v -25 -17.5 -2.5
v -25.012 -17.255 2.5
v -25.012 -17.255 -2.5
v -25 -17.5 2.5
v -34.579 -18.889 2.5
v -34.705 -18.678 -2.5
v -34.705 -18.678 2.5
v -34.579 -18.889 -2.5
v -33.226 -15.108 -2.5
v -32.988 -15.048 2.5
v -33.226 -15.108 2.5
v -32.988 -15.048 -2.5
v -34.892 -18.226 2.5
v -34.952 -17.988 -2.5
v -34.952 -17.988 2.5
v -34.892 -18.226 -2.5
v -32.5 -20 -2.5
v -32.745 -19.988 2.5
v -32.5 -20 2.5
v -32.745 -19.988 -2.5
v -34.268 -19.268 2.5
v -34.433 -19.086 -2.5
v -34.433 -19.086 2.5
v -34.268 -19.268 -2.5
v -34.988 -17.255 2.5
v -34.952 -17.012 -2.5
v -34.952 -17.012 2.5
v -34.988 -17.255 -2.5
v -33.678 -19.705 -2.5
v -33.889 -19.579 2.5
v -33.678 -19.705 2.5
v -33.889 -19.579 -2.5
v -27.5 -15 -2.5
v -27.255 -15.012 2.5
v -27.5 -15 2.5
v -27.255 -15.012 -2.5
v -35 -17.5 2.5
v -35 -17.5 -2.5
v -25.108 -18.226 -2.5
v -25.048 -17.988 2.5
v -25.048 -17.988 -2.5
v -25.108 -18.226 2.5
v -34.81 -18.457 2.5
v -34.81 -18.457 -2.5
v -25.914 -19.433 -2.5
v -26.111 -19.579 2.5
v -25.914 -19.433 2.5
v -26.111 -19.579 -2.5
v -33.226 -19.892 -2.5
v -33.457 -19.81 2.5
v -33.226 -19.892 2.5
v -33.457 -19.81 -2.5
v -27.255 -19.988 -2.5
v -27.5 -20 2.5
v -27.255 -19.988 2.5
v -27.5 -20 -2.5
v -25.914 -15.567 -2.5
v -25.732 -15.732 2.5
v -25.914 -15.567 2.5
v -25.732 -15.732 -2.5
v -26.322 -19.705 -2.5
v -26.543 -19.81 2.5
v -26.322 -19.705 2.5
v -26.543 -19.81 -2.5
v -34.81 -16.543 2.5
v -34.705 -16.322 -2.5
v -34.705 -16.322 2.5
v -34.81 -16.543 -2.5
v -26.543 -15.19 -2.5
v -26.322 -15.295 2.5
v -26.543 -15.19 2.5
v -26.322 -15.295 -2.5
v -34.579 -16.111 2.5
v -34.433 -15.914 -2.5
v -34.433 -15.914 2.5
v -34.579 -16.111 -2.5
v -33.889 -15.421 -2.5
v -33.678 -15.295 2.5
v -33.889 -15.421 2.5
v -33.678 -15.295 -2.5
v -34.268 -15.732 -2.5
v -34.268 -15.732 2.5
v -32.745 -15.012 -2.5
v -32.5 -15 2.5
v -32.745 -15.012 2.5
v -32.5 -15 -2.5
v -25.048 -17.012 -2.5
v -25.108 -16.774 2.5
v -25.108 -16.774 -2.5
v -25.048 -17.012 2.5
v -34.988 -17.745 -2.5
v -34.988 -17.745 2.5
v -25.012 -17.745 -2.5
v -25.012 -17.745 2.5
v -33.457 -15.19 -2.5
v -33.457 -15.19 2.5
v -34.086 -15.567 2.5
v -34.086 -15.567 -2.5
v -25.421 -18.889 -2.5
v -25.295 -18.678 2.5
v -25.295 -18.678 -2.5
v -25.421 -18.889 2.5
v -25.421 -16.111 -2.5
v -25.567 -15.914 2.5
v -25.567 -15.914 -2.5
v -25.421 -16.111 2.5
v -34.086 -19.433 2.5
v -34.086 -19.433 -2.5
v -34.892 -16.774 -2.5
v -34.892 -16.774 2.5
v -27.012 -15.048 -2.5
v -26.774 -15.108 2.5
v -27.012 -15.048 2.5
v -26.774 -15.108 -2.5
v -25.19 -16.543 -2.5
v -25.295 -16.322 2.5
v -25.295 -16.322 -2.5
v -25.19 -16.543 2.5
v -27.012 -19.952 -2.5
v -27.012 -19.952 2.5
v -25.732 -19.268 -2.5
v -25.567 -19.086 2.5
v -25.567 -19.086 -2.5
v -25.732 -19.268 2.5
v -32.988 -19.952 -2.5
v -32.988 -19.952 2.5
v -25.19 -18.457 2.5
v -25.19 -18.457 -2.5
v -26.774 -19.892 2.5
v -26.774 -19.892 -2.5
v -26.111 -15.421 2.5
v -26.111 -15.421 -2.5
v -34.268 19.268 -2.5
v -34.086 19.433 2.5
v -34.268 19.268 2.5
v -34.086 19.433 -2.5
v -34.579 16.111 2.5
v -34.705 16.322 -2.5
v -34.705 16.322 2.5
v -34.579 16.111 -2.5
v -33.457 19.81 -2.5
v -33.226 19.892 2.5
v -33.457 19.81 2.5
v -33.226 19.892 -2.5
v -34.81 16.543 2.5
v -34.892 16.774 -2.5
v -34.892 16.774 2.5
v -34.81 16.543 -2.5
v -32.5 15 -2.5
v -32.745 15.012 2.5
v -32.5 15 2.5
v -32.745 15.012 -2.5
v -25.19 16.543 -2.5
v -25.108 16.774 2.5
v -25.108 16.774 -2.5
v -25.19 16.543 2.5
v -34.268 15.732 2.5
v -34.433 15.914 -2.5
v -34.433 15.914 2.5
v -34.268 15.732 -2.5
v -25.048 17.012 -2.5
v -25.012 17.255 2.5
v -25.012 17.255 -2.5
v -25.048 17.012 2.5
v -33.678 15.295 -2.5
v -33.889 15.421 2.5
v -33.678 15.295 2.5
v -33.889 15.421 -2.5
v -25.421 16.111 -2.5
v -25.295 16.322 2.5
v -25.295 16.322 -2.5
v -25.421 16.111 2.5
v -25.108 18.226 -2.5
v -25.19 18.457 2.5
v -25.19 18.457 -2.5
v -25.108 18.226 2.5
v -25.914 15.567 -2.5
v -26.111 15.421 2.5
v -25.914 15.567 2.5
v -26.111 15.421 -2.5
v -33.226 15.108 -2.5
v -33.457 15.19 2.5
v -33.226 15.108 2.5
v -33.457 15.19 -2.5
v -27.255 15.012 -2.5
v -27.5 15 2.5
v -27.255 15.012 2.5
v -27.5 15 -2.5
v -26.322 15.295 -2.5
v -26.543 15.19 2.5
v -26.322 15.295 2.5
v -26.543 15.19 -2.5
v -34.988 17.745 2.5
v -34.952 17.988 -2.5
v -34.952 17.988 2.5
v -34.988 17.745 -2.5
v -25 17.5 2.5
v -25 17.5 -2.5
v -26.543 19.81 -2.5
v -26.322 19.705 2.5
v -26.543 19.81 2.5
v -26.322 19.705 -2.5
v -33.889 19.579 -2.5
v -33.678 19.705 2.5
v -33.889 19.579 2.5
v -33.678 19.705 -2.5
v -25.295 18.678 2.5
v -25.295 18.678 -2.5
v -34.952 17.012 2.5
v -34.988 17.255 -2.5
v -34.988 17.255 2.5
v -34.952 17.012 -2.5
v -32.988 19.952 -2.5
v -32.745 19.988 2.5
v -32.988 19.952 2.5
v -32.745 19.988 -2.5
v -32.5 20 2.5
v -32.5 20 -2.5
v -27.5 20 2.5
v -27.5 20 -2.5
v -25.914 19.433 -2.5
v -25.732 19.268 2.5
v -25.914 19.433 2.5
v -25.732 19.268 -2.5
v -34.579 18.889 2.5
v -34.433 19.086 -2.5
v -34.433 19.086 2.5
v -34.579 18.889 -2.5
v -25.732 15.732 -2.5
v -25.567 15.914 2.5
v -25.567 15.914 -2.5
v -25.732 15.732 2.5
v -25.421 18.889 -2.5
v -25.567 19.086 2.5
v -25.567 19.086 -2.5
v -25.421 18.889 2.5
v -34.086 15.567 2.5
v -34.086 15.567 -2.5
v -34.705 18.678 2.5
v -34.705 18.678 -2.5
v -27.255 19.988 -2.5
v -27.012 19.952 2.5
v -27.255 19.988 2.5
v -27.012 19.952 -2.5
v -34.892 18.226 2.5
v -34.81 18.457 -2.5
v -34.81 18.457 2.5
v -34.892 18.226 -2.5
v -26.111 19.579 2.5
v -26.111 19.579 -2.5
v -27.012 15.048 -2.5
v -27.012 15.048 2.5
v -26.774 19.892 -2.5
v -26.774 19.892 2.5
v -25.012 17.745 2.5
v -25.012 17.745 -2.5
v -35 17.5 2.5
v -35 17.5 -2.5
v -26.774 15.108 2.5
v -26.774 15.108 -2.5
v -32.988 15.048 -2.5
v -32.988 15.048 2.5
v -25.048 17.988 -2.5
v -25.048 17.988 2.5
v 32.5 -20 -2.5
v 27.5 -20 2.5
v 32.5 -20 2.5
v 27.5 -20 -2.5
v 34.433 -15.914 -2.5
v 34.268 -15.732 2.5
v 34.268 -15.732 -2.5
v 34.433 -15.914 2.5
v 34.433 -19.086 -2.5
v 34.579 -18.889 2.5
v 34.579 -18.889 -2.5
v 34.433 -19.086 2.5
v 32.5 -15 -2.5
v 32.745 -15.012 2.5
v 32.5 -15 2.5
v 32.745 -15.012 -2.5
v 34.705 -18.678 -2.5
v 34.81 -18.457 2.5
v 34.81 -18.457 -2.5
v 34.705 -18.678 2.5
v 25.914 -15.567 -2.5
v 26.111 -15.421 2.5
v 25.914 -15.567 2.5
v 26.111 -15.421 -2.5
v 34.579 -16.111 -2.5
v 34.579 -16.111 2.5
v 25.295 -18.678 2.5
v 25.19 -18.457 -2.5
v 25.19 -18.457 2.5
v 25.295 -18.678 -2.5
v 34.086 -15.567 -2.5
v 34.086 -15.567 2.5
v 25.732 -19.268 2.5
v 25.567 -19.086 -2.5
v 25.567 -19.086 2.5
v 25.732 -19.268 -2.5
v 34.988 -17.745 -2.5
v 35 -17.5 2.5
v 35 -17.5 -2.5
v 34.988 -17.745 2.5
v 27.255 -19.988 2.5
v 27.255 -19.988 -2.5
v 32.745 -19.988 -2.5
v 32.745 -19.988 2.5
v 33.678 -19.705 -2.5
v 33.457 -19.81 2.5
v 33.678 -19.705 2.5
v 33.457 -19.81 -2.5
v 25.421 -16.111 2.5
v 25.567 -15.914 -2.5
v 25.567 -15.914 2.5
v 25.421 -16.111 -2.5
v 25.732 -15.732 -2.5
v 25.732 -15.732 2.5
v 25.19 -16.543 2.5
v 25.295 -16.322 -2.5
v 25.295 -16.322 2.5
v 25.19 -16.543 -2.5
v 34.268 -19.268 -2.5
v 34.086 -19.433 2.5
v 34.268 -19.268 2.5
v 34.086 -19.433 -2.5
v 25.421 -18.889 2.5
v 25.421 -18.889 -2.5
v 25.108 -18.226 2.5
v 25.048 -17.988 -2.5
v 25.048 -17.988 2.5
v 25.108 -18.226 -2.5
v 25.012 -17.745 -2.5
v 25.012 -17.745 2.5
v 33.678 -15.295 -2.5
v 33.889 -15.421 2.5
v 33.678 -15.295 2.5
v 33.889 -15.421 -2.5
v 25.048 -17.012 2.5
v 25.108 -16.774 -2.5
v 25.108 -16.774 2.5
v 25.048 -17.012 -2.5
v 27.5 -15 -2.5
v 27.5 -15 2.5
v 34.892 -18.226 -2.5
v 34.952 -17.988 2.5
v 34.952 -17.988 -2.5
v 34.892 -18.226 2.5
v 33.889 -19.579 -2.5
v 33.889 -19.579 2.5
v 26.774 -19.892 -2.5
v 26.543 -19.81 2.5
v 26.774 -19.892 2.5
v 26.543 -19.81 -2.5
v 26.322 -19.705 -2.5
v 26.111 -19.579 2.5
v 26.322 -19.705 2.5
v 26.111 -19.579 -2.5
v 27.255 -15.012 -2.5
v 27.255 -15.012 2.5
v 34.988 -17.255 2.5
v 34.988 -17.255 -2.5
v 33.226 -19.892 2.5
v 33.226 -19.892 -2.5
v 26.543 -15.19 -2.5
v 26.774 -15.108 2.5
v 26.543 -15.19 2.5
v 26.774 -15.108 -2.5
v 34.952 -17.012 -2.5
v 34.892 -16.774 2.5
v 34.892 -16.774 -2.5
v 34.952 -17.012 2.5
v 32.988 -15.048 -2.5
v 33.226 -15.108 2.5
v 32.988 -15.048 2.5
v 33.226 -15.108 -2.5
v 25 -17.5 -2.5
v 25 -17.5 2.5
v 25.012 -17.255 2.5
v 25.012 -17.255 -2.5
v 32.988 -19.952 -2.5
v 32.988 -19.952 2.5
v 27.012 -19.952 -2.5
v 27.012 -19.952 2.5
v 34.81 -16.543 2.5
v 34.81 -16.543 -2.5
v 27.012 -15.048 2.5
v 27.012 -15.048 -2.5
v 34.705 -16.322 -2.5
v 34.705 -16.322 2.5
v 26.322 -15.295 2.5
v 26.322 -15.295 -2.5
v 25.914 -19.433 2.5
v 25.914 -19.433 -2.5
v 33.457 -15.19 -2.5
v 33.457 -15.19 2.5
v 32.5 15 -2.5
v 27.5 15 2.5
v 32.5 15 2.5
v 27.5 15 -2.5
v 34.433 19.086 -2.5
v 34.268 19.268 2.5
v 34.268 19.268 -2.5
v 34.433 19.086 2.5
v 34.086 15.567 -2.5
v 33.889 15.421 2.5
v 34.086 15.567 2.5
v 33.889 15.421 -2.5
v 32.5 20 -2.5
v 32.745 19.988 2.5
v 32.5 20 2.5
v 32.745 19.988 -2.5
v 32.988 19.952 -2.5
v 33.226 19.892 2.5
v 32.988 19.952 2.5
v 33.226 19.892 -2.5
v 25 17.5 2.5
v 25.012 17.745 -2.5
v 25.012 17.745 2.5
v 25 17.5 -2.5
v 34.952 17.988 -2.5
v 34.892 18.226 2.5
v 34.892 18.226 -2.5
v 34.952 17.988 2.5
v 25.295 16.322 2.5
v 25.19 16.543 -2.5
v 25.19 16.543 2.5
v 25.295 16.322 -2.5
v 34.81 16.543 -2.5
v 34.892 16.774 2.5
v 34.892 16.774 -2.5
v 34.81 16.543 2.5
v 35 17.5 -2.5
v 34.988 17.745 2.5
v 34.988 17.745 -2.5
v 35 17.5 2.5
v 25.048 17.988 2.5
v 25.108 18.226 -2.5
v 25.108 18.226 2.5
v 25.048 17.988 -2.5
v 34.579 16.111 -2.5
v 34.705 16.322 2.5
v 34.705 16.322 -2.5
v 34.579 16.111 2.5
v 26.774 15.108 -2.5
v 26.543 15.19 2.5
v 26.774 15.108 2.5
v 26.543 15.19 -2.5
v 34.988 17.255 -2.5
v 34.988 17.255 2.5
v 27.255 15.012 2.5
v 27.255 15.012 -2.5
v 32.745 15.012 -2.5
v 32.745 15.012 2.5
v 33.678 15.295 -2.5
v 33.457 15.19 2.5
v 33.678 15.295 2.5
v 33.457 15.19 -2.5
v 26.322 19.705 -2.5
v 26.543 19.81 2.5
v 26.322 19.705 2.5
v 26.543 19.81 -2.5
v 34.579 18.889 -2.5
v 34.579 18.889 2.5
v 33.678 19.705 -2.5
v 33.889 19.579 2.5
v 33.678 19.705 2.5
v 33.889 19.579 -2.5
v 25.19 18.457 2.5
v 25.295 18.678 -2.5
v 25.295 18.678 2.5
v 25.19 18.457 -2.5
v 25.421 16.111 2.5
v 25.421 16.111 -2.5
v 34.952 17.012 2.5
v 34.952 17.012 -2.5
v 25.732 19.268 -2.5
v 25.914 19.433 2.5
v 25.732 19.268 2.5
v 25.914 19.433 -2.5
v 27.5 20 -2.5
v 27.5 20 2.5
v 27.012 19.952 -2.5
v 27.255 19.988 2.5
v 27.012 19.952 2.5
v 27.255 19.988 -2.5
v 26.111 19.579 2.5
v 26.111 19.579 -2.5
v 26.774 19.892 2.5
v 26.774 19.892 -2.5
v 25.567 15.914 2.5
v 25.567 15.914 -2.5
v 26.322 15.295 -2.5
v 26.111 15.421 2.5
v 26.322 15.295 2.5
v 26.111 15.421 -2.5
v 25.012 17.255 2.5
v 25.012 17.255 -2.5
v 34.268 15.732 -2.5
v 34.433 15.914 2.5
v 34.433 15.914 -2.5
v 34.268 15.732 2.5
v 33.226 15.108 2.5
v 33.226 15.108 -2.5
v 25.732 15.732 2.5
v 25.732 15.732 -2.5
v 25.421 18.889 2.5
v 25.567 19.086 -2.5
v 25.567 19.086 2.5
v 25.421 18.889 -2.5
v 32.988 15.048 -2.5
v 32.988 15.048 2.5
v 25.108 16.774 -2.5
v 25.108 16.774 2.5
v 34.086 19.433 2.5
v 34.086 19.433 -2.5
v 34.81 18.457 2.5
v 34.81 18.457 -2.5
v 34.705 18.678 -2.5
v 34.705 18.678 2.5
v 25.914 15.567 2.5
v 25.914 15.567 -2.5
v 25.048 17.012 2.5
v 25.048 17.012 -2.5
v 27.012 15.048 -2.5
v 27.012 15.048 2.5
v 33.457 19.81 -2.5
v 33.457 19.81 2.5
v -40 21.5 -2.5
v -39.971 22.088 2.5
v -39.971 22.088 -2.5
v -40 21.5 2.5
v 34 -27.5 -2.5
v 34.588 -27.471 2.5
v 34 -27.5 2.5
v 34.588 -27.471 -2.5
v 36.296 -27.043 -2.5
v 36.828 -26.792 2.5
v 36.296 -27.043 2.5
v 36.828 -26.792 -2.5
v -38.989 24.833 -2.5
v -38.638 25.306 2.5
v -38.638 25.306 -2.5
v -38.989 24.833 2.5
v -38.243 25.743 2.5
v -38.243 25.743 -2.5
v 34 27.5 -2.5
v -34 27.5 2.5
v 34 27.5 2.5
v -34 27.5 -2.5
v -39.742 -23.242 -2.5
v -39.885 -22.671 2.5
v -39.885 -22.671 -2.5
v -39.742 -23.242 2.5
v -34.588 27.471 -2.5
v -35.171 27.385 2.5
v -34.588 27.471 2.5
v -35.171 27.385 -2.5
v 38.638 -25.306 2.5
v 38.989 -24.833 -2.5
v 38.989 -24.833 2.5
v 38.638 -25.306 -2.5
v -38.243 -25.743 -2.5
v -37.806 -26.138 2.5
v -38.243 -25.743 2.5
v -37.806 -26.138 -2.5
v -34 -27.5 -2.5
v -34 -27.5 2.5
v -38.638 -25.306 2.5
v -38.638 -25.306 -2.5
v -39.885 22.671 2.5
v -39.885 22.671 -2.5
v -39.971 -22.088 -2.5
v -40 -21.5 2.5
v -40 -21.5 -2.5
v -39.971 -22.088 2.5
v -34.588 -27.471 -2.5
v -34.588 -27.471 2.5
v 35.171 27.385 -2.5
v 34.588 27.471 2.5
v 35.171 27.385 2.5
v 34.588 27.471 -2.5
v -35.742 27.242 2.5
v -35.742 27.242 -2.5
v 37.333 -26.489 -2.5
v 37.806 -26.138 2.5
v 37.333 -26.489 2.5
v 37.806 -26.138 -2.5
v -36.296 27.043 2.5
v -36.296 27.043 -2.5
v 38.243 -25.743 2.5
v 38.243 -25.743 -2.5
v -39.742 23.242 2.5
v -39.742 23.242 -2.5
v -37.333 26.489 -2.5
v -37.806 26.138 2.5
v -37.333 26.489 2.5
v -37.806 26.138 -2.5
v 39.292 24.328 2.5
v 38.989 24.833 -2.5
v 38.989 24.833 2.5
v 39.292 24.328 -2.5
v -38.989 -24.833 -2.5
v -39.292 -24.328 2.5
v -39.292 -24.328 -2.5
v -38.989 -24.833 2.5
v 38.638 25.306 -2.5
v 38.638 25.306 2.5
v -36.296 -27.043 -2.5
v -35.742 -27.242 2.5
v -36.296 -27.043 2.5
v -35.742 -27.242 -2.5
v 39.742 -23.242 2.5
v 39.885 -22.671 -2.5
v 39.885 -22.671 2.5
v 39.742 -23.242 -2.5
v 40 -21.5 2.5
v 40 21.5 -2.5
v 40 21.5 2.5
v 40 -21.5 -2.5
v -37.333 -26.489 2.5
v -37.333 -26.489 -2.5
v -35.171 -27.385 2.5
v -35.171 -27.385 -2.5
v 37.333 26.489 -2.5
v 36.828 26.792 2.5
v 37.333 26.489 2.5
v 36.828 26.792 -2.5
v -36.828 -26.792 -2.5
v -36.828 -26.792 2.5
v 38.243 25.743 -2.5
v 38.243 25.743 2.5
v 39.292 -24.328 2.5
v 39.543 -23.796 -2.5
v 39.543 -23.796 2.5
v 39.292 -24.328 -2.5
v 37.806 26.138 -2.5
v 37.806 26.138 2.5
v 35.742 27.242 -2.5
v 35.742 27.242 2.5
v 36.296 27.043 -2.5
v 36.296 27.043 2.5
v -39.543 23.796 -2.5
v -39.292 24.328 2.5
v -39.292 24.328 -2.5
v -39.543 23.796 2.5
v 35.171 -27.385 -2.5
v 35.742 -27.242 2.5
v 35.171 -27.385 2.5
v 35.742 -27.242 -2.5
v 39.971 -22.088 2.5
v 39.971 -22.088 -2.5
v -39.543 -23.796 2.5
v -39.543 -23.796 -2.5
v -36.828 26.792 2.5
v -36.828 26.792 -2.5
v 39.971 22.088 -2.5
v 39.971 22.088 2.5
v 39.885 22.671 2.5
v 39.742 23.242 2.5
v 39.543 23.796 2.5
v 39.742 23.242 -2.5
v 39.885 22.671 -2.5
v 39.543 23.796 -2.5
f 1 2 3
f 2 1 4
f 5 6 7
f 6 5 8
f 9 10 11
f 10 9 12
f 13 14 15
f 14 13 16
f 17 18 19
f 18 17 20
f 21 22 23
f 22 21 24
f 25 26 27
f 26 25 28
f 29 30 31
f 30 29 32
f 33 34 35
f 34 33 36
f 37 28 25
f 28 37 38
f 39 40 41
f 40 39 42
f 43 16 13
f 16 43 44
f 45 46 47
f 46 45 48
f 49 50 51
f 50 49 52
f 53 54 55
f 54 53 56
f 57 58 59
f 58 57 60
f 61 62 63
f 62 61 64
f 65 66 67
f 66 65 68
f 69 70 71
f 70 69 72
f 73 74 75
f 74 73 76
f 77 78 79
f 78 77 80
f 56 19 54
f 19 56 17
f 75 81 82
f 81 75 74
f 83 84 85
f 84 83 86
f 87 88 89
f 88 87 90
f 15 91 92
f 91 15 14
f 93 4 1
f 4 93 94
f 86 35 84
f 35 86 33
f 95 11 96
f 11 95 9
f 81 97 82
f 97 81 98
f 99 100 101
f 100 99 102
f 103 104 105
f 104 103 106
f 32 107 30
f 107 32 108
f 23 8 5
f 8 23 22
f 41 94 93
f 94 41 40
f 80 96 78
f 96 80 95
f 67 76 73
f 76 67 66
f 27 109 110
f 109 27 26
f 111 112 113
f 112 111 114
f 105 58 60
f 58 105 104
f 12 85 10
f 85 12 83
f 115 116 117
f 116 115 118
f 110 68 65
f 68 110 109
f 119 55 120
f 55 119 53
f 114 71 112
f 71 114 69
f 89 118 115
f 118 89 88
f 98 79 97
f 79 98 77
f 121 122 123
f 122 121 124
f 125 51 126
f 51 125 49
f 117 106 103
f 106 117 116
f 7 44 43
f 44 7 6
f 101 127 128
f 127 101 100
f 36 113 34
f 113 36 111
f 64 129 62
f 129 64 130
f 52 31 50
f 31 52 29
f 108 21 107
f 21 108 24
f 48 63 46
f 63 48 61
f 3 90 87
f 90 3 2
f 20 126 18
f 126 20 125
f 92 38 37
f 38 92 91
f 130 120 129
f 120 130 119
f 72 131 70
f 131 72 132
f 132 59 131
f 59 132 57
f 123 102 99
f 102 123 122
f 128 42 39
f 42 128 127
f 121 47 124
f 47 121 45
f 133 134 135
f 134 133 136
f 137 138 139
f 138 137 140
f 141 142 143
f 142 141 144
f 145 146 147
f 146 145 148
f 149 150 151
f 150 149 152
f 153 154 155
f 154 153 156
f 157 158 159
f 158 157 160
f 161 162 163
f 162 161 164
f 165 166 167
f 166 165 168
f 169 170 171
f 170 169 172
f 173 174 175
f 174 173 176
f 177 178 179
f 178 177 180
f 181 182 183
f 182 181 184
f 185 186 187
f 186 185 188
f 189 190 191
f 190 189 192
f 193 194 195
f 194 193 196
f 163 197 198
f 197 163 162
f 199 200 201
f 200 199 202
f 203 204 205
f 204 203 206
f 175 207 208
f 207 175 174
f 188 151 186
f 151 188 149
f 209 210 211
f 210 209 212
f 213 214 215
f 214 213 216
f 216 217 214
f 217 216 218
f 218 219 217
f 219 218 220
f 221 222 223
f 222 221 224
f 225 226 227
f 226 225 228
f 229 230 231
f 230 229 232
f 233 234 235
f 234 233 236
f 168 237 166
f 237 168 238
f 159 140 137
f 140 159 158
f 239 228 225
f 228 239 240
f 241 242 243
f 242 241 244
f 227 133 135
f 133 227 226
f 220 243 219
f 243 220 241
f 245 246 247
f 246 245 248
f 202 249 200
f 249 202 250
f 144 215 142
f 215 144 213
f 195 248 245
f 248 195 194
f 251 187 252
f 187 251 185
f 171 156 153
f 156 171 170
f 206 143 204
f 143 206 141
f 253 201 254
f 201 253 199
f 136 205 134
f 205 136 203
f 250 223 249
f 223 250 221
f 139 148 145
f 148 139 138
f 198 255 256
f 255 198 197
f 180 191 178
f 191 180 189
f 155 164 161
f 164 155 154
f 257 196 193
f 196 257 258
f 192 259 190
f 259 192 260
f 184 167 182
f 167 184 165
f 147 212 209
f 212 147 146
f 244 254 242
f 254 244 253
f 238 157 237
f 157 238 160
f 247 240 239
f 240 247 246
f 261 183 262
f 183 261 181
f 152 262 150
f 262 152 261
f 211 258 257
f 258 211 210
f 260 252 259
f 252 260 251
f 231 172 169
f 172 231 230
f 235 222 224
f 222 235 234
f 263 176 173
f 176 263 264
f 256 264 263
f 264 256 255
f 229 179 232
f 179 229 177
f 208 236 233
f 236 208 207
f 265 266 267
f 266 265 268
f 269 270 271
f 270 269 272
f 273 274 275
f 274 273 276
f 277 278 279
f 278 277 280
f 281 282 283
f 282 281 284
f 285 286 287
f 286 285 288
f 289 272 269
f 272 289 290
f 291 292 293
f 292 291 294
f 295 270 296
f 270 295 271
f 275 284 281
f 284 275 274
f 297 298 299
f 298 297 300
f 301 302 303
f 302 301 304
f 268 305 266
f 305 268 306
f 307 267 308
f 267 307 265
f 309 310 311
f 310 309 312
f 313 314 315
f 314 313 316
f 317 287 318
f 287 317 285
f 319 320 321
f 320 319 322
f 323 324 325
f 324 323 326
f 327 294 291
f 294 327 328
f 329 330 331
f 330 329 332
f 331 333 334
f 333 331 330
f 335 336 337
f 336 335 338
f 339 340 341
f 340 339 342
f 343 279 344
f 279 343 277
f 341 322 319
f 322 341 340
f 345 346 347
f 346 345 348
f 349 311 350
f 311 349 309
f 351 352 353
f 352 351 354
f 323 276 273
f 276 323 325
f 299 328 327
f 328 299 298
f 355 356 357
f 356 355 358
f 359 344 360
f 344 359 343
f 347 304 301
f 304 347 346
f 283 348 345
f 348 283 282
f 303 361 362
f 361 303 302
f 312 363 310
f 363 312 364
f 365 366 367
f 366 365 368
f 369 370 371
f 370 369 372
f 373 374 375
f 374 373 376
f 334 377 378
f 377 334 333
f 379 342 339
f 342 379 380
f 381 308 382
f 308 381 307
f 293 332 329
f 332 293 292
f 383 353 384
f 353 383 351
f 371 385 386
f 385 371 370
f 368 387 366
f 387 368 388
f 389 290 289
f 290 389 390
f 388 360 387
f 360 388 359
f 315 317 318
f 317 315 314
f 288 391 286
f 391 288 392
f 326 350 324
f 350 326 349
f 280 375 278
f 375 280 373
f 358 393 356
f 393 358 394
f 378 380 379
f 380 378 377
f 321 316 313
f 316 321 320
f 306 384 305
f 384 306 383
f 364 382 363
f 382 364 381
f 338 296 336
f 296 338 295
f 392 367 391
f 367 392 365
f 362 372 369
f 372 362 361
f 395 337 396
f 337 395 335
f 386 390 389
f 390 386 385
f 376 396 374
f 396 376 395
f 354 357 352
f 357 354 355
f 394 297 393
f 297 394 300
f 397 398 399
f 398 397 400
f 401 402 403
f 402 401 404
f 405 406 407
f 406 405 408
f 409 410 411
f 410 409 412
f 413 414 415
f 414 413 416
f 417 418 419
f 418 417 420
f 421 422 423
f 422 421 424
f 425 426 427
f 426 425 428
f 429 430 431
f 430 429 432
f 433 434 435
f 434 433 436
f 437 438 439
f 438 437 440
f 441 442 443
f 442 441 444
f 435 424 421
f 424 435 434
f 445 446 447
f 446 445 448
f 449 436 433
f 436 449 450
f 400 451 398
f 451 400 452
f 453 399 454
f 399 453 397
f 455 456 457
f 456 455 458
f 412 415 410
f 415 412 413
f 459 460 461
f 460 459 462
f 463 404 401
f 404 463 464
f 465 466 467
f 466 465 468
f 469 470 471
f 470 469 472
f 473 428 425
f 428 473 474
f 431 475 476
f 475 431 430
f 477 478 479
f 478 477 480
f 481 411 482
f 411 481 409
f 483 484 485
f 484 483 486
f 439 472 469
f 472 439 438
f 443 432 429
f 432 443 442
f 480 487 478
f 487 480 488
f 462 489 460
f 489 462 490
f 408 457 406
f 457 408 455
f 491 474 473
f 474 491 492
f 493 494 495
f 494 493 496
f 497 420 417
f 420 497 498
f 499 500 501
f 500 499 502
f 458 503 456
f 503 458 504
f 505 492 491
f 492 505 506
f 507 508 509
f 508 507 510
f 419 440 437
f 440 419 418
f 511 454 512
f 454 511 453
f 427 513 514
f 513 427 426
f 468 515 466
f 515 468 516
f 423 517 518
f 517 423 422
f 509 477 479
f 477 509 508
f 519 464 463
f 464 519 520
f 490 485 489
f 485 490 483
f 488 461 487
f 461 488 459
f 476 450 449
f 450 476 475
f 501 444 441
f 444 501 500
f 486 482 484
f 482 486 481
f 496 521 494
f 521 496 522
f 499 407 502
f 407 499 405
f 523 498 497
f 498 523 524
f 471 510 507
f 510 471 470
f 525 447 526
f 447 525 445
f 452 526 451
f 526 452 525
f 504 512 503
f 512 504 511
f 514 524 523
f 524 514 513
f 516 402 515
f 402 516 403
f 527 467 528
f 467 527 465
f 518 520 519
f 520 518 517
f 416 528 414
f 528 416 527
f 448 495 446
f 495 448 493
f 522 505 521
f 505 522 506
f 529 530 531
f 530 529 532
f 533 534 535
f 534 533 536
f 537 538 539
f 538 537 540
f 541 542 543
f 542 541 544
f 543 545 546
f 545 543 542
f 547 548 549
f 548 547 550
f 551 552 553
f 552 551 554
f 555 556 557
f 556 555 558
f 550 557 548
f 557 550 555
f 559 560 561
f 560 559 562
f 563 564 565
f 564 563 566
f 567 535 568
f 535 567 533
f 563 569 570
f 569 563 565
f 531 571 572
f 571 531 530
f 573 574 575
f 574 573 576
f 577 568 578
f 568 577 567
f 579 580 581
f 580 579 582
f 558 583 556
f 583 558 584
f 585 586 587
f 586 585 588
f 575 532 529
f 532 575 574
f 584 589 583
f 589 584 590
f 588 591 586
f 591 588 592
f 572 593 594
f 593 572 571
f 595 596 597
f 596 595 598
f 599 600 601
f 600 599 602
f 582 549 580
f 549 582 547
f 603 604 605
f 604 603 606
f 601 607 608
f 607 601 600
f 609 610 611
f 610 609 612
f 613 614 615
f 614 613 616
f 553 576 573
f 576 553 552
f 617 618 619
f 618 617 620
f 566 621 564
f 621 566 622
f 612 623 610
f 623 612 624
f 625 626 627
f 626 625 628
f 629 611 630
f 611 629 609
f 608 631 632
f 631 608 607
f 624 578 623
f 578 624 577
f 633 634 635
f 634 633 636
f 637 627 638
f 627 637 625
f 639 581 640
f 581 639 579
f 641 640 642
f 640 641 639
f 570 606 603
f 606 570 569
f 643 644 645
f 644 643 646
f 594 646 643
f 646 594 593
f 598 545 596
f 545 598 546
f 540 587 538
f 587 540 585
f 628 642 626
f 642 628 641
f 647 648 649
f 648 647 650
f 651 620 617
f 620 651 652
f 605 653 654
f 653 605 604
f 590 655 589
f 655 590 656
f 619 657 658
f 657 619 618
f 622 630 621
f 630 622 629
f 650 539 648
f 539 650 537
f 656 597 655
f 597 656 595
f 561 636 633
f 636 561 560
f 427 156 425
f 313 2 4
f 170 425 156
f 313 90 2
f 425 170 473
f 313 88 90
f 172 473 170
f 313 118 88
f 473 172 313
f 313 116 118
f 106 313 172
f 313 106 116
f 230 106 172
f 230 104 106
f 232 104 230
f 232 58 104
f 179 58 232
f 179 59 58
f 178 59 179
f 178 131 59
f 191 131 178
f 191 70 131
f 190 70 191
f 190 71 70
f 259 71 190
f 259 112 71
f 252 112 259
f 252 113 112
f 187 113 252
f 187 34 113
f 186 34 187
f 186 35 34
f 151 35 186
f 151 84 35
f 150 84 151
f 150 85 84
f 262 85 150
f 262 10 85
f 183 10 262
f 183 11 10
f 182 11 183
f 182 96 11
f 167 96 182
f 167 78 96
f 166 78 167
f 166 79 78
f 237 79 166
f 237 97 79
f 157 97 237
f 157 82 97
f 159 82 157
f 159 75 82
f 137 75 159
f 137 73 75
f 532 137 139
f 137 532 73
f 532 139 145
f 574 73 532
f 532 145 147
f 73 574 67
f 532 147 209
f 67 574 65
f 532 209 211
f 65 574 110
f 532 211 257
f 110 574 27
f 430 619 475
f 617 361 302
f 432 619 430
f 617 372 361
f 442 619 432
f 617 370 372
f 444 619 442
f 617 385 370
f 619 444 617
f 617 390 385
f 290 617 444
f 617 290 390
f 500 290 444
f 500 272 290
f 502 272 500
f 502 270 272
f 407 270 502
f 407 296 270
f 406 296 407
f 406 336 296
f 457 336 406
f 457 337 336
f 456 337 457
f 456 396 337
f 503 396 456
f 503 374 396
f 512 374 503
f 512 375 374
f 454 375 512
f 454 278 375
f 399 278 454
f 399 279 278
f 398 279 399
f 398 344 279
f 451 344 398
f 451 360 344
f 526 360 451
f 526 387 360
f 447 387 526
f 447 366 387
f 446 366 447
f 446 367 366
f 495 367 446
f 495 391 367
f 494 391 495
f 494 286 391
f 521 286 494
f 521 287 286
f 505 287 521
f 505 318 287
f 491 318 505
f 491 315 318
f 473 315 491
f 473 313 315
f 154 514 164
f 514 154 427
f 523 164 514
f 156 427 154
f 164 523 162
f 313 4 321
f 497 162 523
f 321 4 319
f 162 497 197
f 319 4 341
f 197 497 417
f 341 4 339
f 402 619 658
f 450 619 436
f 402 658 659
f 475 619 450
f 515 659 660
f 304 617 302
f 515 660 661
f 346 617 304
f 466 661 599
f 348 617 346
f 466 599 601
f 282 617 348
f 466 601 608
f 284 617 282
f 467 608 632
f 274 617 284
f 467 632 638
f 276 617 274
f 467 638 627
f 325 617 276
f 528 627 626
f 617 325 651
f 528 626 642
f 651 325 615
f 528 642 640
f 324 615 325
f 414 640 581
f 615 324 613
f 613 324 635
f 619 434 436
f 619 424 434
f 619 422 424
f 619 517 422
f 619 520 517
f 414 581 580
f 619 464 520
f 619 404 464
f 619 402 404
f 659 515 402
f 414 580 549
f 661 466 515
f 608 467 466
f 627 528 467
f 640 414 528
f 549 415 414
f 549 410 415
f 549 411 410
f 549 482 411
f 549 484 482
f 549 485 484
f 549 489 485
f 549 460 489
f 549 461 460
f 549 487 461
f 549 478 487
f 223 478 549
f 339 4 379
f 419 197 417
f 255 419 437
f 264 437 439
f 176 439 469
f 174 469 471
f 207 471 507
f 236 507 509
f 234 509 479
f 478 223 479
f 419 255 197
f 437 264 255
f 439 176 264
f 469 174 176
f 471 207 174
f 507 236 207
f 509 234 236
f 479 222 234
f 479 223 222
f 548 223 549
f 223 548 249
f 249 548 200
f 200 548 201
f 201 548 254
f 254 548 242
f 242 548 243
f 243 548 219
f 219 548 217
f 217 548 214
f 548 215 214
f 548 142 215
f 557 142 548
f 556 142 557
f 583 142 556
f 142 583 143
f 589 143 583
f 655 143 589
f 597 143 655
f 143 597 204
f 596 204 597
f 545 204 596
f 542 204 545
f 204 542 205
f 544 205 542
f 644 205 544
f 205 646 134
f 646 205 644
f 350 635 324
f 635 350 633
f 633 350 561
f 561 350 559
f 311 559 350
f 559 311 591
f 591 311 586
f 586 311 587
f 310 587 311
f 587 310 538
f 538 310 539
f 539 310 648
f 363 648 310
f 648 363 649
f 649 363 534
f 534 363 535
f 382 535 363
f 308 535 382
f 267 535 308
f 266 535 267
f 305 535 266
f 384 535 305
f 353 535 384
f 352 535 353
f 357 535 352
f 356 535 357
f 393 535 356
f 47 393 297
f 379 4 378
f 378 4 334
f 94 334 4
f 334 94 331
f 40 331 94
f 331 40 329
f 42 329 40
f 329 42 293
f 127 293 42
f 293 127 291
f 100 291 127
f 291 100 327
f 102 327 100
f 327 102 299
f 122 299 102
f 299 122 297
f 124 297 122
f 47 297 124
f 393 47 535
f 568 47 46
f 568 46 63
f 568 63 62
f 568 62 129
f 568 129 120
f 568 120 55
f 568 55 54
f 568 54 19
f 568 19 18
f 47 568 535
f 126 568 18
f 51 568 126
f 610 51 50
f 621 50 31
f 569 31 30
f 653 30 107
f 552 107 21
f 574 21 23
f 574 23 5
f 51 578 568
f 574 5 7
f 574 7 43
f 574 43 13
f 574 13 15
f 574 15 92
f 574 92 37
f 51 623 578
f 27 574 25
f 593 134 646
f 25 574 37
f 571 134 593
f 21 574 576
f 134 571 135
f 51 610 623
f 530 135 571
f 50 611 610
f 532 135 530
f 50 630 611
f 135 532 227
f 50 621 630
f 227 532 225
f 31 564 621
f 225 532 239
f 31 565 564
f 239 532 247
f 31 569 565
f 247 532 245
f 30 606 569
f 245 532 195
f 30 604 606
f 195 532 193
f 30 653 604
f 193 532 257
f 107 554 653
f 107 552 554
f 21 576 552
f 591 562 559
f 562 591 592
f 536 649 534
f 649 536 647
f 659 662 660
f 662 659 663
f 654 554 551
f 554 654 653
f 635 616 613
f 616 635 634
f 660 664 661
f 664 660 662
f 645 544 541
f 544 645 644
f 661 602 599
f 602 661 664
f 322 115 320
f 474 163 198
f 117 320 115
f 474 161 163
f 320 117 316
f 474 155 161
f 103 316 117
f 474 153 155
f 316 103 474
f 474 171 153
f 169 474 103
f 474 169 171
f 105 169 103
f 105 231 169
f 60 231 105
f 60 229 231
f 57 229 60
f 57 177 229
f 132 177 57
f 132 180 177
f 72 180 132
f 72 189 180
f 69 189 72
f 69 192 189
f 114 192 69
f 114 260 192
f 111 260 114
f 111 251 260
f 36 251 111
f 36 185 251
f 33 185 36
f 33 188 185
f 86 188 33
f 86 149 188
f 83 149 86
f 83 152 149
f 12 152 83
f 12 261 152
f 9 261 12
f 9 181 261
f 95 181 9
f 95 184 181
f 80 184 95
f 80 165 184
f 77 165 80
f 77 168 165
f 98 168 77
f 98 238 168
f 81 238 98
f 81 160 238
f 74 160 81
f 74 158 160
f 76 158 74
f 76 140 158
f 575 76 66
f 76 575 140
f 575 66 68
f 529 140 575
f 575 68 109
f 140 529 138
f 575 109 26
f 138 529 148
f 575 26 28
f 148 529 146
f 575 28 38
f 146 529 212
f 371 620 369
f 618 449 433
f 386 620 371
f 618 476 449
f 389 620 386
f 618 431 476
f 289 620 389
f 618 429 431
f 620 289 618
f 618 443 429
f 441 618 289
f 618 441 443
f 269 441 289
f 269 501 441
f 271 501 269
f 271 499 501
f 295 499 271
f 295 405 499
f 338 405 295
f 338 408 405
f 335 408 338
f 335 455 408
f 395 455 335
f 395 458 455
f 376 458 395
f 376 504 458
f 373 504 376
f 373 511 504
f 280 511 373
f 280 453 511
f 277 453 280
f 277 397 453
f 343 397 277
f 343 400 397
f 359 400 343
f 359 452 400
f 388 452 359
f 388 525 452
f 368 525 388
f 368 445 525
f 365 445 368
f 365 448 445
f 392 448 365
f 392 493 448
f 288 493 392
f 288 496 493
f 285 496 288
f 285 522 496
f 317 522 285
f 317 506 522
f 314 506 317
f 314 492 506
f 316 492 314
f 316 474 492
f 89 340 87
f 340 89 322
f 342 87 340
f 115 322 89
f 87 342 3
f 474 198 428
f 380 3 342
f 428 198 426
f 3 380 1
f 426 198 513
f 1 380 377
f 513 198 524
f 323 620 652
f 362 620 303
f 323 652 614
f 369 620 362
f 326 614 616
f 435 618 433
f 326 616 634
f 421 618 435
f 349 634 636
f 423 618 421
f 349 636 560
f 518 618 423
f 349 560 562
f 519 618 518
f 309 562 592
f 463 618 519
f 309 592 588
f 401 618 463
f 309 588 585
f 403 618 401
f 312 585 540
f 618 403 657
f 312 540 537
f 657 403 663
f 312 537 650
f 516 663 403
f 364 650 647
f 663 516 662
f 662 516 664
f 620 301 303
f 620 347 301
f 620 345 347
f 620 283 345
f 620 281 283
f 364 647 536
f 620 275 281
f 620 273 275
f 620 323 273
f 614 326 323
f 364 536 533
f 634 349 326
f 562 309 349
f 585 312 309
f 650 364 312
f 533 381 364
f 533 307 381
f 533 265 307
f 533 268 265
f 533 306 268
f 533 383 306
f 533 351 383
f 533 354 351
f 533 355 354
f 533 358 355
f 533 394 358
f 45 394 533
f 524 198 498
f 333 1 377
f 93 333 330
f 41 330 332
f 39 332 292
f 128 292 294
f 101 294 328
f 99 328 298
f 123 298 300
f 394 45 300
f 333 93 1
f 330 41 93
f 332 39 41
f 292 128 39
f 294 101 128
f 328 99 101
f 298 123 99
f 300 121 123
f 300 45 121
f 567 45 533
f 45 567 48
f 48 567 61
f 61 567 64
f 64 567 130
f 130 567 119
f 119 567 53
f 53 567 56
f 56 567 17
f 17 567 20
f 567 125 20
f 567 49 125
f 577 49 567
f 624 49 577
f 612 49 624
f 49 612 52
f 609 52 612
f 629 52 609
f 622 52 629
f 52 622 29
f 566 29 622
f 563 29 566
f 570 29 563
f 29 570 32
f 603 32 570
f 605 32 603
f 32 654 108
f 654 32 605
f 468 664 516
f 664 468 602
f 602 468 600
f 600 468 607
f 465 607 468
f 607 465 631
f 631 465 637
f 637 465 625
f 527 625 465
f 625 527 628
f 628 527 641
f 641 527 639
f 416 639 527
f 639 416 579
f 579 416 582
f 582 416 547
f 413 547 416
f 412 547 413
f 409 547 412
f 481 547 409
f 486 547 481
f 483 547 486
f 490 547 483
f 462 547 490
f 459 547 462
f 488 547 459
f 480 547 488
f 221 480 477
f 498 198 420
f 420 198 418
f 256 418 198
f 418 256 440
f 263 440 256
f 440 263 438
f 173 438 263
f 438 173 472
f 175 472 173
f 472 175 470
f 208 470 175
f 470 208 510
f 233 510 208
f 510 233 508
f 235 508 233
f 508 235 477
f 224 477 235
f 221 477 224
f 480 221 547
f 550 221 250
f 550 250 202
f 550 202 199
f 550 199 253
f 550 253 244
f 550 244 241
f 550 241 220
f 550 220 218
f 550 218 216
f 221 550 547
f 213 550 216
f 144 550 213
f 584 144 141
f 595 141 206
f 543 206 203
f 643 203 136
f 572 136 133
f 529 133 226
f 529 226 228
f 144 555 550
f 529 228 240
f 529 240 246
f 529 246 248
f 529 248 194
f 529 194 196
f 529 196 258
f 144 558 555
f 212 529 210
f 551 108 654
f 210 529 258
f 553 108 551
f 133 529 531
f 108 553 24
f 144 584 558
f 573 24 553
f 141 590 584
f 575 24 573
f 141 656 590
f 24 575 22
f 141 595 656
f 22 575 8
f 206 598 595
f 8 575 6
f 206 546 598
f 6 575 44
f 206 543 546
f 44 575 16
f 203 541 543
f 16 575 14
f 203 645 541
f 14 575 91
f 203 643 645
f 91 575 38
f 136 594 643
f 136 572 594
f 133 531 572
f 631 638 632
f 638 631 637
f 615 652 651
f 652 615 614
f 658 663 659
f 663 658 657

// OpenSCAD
/*
    Parametric mounting plate generator

    Creates a rectangular mounting plate with rounded corners and
    four configurable mounting holes.

    Author: Lourenço Guerreiro
    Units: millimetres
*/

$fn = 64;

plate_width = 80;
plate_length = 55;
plate_thickness = 5;
corner_radius = 6;

hole_diameter = 5;
slot_length = 10;
slot_angle = 0;

hole_offset_x = 10;
hole_offset_y = 10;

epsilon = 0.02;


/*
    Creates the main plate body.

    The corner radius is produced by applying an offset to a smaller
    rectangle before extruding it.
*/
module rounded_plate(width, length, thickness, radius) {

    assert(width > 0, "Plate width must be greater than zero.");
    assert(length > 0, "Plate length must be greater than zero.");
    assert(thickness > 0, "Plate thickness must be greater than zero.");
    assert(radius >= 0, "Corner radius cannot be negative.");
    assert(
        radius <= min(width, length) / 2,
        "Corner radius is too large for the plate dimensions."
    );

    linear_extrude(height = thickness, center = true)
        if (radius > 0) {
            offset(r = radius)
                square(
                    [
                        width - 2 * radius,
                        length - 2 * radius
                    ],
                    center = true
                );
        }
        else {
            square([width, length], center = true);
        }
}


/*
    Creates either a round hole or a slotted hole.

    slot_length represents the total external length of the slot.
    When slot_length equals hole_diameter, the result is a round hole.
*/
module mounting_hole(
    diameter,
    total_length,
    height,
    angle = 0
) {

    assert(diameter > 0, "Hole diameter must be greater than zero.");
    assert(
        total_length >= diameter,
        "Slot length must be equal to or greater than the hole diameter."
    );

    centre_distance = total_length - diameter;

    rotate([0, 0, angle])
        hull() {
            translate([-centre_distance / 2, 0, 0])
                cylinder(
                    d = diameter,
                    h = height,
                    center = true
                );

            translate([centre_distance / 2, 0, 0])
                cylinder(
                    d = diameter,
                    h = height,
                    center = true
                );
        }
}


/*
    Places one mounting hole near each corner of the plate.
*/
module four_hole_pattern(
    plate_width,
    plate_length,
    offset_x,
    offset_y
) {

    x_positions = [
        -plate_width / 2 + offset_x,
         plate_width / 2 - offset_x
    ];

    y_positions = [
        -plate_length / 2 + offset_y,
         plate_length / 2 - offset_y
    ];

    for (x = x_positions)
        for (y = y_positions)
            translate([x, y, 0])
                mounting_hole(
                    diameter = hole_diameter,
                    total_length = slot_length,
                    height = plate_thickness + 2 * epsilon,
                    angle = slot_angle
                );
}


module mounting_plate() {

    hole_radius = hole_diameter / 2;

    assert(
        hole_offset_x >= slot_length / 2,
        "The mounting holes are too close to the left or right edge."
    );

    assert(
        hole_offset_y >= hole_radius,
        "The mounting holes are too close to the top or bottom edge."
    );

    assert(
        hole_offset_x < plate_width / 2,
        "Horizontal hole offset must be smaller than half the plate width."
    );

    assert(
        hole_offset_y < plate_length / 2,
        "Vertical hole offset must be smaller than half the plate length."
    );

    difference() {

        rounded_plate(
            width = plate_width,
            length = plate_length,
            thickness = plate_thickness,
            radius = corner_radius
        );

        four_hole_pattern(
            plate_width = plate_width,
            plate_length = plate_length,
            offset_x = hole_offset_x,
            offset_y = hole_offset_y
        );
    }
}


mounting_plate();
